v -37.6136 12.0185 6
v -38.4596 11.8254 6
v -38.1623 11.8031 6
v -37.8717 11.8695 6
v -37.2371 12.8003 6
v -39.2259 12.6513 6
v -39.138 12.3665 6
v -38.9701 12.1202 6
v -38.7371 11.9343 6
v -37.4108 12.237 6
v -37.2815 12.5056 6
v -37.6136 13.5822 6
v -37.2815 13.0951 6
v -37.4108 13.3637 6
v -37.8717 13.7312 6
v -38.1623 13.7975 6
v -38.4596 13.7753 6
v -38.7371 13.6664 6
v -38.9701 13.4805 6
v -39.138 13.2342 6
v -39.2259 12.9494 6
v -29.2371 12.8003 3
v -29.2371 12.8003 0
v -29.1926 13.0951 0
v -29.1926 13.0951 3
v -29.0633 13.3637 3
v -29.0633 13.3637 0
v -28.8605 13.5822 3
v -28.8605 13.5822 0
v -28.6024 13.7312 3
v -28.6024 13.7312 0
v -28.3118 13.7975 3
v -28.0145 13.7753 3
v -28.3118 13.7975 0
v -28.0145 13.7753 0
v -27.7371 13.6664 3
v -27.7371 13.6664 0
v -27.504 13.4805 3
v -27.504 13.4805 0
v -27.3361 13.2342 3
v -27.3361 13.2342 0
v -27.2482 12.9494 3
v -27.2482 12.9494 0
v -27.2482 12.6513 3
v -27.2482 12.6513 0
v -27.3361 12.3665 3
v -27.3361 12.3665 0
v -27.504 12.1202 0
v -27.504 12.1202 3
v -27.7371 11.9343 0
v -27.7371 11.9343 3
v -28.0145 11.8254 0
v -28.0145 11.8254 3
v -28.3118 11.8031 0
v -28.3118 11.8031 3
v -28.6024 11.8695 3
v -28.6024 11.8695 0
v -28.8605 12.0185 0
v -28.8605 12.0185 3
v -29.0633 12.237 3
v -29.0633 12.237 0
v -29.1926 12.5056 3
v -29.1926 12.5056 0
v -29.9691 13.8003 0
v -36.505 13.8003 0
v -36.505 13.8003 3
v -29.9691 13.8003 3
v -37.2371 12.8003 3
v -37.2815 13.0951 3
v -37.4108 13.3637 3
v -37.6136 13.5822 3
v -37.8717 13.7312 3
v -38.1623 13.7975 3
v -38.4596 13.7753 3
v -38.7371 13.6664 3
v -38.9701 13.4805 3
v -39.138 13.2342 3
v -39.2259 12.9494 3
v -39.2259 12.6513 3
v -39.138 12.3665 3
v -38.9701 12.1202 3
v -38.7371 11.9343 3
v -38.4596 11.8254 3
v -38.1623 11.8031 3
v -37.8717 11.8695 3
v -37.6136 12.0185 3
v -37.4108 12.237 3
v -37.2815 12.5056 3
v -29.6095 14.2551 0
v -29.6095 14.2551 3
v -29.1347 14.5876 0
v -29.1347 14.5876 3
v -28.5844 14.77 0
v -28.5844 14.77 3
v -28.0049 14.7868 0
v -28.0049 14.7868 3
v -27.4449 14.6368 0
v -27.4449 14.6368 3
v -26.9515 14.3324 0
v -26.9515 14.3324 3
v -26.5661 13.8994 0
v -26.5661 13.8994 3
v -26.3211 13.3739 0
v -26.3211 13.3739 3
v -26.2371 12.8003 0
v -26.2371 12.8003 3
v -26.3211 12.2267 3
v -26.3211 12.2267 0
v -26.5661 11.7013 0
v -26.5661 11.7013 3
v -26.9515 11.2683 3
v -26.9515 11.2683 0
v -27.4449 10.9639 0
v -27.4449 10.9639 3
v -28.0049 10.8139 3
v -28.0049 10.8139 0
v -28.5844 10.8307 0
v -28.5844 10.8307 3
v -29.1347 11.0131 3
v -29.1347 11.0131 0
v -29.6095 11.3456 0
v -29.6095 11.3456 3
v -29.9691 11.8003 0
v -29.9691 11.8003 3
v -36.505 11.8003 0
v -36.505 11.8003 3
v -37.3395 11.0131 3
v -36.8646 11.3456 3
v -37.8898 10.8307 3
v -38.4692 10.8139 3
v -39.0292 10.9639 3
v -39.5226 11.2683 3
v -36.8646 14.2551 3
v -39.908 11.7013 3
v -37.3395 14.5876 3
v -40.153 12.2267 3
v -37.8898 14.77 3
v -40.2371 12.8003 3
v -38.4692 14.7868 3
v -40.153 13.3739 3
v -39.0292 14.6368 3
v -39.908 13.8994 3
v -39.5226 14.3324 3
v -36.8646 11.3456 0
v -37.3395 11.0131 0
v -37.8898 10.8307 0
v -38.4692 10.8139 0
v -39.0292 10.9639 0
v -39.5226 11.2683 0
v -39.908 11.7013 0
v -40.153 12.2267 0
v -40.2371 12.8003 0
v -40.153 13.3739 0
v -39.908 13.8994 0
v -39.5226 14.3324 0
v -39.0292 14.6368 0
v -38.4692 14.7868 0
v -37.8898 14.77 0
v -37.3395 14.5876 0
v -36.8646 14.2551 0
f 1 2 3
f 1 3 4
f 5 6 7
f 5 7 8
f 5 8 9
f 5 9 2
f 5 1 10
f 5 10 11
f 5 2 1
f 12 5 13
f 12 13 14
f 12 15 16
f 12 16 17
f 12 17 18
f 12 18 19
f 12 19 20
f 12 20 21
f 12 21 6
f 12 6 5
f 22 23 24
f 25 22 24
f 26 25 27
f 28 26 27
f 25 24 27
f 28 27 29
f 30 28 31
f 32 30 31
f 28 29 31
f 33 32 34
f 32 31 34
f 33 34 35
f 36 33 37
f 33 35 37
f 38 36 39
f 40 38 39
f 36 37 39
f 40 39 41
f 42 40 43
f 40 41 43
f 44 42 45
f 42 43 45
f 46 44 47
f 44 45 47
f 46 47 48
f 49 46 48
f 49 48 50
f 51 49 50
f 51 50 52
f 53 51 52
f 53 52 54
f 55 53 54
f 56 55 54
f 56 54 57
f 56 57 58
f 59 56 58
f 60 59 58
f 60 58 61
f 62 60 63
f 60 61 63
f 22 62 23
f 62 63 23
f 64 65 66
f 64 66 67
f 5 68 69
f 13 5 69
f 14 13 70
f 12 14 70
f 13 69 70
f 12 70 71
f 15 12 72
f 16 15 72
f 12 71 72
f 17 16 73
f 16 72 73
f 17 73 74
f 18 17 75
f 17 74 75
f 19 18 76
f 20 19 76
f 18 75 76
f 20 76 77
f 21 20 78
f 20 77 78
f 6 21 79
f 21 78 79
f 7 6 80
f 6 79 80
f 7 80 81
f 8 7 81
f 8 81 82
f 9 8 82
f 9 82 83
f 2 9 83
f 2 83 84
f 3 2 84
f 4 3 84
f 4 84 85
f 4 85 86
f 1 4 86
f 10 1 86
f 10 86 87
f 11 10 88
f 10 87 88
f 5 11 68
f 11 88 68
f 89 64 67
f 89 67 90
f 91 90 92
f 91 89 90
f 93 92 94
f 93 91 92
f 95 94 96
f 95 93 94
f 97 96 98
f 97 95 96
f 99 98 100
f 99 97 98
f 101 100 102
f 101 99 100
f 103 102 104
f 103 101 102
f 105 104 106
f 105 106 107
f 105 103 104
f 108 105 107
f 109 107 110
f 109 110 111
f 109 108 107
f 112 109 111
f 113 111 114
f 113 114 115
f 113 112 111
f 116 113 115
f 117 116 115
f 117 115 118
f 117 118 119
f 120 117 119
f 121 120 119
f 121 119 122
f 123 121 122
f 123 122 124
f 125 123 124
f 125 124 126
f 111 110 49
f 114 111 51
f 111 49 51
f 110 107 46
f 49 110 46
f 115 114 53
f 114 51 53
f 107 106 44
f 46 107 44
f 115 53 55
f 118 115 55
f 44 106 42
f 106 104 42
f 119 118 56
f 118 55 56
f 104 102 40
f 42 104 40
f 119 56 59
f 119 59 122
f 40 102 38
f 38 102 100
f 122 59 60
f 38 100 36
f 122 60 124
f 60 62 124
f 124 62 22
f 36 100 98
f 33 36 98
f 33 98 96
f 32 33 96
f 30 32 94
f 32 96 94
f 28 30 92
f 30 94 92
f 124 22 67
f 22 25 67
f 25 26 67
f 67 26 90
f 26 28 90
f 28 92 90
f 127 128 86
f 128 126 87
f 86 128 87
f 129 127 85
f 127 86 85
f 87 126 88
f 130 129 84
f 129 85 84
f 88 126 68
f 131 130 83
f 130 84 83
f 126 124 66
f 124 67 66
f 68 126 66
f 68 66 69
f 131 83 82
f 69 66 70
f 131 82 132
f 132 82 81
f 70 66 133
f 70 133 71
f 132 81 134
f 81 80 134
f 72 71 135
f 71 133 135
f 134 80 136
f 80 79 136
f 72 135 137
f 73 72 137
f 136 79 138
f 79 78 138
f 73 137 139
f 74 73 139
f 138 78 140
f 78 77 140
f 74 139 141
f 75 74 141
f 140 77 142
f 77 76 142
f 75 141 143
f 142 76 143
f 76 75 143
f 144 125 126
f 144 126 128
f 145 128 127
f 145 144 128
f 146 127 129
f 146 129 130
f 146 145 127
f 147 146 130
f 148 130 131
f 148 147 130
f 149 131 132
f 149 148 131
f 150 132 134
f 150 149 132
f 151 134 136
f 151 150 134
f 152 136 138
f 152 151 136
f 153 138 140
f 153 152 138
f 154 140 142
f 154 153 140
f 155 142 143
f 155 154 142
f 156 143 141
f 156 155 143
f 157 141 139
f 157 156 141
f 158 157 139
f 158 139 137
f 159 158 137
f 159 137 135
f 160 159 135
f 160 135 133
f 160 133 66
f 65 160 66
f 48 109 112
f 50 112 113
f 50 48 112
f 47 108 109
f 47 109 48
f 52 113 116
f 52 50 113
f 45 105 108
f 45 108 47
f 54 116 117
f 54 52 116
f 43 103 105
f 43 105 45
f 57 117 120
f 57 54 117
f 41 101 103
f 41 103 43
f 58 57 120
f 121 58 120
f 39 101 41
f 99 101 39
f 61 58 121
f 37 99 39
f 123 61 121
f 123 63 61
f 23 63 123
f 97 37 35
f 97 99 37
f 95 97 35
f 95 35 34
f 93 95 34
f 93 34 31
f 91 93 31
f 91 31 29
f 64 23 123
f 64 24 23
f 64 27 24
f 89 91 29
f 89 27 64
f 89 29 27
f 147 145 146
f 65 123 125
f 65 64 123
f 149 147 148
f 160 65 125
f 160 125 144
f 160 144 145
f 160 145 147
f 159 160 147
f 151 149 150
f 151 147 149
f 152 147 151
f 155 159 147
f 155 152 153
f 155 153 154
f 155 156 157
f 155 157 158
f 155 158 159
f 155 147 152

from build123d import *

# Parameters (mm, degrees)
BOSS_EXTRUDE1_DEPTH = 3
SKETCH3_R           = 1
BOSS_EXTRUDE2_DEPTH = 3
SKETCH4_R           = 1
CUT_EXTRUDE1_DEPTH  = 3


with BuildPart() as part:
    # Sketch2 → Boss-Extrude1 (new body)
    with BuildSketch(Plane.XY):
        with BuildLine():
            Line((-36.5050045, 13.800340042), (-29.969106115, 13.800340042))
            ThreePointArc((-29.969106115, 13.800340042), (-26.237055307, 12.800340042), (-29.969106115, 11.800340042))
            Line((-29.969106115, 11.800340042), (-36.5050045, 11.800340042))
            ThreePointArc((-36.5050045, 11.800340042), (-40.237055307, 12.800340042), (-36.5050045, 13.800340042))
        make_face()
    extrude(amount=BOSS_EXTRUDE1_DEPTH)

    # Sketch3 → Boss-Extrude2 (add)
    with BuildSketch(Plane.XY.offset(3)):
        with Locations((-38.237055307, 12.800340042)):
            Circle(SKETCH3_R)
    extrude(amount=BOSS_EXTRUDE2_DEPTH)

    # Sketch4 → Cut-Extrude1 (cut)
    with BuildSketch(Plane(origin=(0, 0, 0), x_dir=(-1, 0, 0), z_dir=(0, 0, -1))):
        with Locations((28.237055307, 12.800340042)):
            Circle(SKETCH4_R)
    extrude(amount=-CUT_EXTRUDE1_DEPTH, mode=Mode.SUBTRACT)


solid = part.part
